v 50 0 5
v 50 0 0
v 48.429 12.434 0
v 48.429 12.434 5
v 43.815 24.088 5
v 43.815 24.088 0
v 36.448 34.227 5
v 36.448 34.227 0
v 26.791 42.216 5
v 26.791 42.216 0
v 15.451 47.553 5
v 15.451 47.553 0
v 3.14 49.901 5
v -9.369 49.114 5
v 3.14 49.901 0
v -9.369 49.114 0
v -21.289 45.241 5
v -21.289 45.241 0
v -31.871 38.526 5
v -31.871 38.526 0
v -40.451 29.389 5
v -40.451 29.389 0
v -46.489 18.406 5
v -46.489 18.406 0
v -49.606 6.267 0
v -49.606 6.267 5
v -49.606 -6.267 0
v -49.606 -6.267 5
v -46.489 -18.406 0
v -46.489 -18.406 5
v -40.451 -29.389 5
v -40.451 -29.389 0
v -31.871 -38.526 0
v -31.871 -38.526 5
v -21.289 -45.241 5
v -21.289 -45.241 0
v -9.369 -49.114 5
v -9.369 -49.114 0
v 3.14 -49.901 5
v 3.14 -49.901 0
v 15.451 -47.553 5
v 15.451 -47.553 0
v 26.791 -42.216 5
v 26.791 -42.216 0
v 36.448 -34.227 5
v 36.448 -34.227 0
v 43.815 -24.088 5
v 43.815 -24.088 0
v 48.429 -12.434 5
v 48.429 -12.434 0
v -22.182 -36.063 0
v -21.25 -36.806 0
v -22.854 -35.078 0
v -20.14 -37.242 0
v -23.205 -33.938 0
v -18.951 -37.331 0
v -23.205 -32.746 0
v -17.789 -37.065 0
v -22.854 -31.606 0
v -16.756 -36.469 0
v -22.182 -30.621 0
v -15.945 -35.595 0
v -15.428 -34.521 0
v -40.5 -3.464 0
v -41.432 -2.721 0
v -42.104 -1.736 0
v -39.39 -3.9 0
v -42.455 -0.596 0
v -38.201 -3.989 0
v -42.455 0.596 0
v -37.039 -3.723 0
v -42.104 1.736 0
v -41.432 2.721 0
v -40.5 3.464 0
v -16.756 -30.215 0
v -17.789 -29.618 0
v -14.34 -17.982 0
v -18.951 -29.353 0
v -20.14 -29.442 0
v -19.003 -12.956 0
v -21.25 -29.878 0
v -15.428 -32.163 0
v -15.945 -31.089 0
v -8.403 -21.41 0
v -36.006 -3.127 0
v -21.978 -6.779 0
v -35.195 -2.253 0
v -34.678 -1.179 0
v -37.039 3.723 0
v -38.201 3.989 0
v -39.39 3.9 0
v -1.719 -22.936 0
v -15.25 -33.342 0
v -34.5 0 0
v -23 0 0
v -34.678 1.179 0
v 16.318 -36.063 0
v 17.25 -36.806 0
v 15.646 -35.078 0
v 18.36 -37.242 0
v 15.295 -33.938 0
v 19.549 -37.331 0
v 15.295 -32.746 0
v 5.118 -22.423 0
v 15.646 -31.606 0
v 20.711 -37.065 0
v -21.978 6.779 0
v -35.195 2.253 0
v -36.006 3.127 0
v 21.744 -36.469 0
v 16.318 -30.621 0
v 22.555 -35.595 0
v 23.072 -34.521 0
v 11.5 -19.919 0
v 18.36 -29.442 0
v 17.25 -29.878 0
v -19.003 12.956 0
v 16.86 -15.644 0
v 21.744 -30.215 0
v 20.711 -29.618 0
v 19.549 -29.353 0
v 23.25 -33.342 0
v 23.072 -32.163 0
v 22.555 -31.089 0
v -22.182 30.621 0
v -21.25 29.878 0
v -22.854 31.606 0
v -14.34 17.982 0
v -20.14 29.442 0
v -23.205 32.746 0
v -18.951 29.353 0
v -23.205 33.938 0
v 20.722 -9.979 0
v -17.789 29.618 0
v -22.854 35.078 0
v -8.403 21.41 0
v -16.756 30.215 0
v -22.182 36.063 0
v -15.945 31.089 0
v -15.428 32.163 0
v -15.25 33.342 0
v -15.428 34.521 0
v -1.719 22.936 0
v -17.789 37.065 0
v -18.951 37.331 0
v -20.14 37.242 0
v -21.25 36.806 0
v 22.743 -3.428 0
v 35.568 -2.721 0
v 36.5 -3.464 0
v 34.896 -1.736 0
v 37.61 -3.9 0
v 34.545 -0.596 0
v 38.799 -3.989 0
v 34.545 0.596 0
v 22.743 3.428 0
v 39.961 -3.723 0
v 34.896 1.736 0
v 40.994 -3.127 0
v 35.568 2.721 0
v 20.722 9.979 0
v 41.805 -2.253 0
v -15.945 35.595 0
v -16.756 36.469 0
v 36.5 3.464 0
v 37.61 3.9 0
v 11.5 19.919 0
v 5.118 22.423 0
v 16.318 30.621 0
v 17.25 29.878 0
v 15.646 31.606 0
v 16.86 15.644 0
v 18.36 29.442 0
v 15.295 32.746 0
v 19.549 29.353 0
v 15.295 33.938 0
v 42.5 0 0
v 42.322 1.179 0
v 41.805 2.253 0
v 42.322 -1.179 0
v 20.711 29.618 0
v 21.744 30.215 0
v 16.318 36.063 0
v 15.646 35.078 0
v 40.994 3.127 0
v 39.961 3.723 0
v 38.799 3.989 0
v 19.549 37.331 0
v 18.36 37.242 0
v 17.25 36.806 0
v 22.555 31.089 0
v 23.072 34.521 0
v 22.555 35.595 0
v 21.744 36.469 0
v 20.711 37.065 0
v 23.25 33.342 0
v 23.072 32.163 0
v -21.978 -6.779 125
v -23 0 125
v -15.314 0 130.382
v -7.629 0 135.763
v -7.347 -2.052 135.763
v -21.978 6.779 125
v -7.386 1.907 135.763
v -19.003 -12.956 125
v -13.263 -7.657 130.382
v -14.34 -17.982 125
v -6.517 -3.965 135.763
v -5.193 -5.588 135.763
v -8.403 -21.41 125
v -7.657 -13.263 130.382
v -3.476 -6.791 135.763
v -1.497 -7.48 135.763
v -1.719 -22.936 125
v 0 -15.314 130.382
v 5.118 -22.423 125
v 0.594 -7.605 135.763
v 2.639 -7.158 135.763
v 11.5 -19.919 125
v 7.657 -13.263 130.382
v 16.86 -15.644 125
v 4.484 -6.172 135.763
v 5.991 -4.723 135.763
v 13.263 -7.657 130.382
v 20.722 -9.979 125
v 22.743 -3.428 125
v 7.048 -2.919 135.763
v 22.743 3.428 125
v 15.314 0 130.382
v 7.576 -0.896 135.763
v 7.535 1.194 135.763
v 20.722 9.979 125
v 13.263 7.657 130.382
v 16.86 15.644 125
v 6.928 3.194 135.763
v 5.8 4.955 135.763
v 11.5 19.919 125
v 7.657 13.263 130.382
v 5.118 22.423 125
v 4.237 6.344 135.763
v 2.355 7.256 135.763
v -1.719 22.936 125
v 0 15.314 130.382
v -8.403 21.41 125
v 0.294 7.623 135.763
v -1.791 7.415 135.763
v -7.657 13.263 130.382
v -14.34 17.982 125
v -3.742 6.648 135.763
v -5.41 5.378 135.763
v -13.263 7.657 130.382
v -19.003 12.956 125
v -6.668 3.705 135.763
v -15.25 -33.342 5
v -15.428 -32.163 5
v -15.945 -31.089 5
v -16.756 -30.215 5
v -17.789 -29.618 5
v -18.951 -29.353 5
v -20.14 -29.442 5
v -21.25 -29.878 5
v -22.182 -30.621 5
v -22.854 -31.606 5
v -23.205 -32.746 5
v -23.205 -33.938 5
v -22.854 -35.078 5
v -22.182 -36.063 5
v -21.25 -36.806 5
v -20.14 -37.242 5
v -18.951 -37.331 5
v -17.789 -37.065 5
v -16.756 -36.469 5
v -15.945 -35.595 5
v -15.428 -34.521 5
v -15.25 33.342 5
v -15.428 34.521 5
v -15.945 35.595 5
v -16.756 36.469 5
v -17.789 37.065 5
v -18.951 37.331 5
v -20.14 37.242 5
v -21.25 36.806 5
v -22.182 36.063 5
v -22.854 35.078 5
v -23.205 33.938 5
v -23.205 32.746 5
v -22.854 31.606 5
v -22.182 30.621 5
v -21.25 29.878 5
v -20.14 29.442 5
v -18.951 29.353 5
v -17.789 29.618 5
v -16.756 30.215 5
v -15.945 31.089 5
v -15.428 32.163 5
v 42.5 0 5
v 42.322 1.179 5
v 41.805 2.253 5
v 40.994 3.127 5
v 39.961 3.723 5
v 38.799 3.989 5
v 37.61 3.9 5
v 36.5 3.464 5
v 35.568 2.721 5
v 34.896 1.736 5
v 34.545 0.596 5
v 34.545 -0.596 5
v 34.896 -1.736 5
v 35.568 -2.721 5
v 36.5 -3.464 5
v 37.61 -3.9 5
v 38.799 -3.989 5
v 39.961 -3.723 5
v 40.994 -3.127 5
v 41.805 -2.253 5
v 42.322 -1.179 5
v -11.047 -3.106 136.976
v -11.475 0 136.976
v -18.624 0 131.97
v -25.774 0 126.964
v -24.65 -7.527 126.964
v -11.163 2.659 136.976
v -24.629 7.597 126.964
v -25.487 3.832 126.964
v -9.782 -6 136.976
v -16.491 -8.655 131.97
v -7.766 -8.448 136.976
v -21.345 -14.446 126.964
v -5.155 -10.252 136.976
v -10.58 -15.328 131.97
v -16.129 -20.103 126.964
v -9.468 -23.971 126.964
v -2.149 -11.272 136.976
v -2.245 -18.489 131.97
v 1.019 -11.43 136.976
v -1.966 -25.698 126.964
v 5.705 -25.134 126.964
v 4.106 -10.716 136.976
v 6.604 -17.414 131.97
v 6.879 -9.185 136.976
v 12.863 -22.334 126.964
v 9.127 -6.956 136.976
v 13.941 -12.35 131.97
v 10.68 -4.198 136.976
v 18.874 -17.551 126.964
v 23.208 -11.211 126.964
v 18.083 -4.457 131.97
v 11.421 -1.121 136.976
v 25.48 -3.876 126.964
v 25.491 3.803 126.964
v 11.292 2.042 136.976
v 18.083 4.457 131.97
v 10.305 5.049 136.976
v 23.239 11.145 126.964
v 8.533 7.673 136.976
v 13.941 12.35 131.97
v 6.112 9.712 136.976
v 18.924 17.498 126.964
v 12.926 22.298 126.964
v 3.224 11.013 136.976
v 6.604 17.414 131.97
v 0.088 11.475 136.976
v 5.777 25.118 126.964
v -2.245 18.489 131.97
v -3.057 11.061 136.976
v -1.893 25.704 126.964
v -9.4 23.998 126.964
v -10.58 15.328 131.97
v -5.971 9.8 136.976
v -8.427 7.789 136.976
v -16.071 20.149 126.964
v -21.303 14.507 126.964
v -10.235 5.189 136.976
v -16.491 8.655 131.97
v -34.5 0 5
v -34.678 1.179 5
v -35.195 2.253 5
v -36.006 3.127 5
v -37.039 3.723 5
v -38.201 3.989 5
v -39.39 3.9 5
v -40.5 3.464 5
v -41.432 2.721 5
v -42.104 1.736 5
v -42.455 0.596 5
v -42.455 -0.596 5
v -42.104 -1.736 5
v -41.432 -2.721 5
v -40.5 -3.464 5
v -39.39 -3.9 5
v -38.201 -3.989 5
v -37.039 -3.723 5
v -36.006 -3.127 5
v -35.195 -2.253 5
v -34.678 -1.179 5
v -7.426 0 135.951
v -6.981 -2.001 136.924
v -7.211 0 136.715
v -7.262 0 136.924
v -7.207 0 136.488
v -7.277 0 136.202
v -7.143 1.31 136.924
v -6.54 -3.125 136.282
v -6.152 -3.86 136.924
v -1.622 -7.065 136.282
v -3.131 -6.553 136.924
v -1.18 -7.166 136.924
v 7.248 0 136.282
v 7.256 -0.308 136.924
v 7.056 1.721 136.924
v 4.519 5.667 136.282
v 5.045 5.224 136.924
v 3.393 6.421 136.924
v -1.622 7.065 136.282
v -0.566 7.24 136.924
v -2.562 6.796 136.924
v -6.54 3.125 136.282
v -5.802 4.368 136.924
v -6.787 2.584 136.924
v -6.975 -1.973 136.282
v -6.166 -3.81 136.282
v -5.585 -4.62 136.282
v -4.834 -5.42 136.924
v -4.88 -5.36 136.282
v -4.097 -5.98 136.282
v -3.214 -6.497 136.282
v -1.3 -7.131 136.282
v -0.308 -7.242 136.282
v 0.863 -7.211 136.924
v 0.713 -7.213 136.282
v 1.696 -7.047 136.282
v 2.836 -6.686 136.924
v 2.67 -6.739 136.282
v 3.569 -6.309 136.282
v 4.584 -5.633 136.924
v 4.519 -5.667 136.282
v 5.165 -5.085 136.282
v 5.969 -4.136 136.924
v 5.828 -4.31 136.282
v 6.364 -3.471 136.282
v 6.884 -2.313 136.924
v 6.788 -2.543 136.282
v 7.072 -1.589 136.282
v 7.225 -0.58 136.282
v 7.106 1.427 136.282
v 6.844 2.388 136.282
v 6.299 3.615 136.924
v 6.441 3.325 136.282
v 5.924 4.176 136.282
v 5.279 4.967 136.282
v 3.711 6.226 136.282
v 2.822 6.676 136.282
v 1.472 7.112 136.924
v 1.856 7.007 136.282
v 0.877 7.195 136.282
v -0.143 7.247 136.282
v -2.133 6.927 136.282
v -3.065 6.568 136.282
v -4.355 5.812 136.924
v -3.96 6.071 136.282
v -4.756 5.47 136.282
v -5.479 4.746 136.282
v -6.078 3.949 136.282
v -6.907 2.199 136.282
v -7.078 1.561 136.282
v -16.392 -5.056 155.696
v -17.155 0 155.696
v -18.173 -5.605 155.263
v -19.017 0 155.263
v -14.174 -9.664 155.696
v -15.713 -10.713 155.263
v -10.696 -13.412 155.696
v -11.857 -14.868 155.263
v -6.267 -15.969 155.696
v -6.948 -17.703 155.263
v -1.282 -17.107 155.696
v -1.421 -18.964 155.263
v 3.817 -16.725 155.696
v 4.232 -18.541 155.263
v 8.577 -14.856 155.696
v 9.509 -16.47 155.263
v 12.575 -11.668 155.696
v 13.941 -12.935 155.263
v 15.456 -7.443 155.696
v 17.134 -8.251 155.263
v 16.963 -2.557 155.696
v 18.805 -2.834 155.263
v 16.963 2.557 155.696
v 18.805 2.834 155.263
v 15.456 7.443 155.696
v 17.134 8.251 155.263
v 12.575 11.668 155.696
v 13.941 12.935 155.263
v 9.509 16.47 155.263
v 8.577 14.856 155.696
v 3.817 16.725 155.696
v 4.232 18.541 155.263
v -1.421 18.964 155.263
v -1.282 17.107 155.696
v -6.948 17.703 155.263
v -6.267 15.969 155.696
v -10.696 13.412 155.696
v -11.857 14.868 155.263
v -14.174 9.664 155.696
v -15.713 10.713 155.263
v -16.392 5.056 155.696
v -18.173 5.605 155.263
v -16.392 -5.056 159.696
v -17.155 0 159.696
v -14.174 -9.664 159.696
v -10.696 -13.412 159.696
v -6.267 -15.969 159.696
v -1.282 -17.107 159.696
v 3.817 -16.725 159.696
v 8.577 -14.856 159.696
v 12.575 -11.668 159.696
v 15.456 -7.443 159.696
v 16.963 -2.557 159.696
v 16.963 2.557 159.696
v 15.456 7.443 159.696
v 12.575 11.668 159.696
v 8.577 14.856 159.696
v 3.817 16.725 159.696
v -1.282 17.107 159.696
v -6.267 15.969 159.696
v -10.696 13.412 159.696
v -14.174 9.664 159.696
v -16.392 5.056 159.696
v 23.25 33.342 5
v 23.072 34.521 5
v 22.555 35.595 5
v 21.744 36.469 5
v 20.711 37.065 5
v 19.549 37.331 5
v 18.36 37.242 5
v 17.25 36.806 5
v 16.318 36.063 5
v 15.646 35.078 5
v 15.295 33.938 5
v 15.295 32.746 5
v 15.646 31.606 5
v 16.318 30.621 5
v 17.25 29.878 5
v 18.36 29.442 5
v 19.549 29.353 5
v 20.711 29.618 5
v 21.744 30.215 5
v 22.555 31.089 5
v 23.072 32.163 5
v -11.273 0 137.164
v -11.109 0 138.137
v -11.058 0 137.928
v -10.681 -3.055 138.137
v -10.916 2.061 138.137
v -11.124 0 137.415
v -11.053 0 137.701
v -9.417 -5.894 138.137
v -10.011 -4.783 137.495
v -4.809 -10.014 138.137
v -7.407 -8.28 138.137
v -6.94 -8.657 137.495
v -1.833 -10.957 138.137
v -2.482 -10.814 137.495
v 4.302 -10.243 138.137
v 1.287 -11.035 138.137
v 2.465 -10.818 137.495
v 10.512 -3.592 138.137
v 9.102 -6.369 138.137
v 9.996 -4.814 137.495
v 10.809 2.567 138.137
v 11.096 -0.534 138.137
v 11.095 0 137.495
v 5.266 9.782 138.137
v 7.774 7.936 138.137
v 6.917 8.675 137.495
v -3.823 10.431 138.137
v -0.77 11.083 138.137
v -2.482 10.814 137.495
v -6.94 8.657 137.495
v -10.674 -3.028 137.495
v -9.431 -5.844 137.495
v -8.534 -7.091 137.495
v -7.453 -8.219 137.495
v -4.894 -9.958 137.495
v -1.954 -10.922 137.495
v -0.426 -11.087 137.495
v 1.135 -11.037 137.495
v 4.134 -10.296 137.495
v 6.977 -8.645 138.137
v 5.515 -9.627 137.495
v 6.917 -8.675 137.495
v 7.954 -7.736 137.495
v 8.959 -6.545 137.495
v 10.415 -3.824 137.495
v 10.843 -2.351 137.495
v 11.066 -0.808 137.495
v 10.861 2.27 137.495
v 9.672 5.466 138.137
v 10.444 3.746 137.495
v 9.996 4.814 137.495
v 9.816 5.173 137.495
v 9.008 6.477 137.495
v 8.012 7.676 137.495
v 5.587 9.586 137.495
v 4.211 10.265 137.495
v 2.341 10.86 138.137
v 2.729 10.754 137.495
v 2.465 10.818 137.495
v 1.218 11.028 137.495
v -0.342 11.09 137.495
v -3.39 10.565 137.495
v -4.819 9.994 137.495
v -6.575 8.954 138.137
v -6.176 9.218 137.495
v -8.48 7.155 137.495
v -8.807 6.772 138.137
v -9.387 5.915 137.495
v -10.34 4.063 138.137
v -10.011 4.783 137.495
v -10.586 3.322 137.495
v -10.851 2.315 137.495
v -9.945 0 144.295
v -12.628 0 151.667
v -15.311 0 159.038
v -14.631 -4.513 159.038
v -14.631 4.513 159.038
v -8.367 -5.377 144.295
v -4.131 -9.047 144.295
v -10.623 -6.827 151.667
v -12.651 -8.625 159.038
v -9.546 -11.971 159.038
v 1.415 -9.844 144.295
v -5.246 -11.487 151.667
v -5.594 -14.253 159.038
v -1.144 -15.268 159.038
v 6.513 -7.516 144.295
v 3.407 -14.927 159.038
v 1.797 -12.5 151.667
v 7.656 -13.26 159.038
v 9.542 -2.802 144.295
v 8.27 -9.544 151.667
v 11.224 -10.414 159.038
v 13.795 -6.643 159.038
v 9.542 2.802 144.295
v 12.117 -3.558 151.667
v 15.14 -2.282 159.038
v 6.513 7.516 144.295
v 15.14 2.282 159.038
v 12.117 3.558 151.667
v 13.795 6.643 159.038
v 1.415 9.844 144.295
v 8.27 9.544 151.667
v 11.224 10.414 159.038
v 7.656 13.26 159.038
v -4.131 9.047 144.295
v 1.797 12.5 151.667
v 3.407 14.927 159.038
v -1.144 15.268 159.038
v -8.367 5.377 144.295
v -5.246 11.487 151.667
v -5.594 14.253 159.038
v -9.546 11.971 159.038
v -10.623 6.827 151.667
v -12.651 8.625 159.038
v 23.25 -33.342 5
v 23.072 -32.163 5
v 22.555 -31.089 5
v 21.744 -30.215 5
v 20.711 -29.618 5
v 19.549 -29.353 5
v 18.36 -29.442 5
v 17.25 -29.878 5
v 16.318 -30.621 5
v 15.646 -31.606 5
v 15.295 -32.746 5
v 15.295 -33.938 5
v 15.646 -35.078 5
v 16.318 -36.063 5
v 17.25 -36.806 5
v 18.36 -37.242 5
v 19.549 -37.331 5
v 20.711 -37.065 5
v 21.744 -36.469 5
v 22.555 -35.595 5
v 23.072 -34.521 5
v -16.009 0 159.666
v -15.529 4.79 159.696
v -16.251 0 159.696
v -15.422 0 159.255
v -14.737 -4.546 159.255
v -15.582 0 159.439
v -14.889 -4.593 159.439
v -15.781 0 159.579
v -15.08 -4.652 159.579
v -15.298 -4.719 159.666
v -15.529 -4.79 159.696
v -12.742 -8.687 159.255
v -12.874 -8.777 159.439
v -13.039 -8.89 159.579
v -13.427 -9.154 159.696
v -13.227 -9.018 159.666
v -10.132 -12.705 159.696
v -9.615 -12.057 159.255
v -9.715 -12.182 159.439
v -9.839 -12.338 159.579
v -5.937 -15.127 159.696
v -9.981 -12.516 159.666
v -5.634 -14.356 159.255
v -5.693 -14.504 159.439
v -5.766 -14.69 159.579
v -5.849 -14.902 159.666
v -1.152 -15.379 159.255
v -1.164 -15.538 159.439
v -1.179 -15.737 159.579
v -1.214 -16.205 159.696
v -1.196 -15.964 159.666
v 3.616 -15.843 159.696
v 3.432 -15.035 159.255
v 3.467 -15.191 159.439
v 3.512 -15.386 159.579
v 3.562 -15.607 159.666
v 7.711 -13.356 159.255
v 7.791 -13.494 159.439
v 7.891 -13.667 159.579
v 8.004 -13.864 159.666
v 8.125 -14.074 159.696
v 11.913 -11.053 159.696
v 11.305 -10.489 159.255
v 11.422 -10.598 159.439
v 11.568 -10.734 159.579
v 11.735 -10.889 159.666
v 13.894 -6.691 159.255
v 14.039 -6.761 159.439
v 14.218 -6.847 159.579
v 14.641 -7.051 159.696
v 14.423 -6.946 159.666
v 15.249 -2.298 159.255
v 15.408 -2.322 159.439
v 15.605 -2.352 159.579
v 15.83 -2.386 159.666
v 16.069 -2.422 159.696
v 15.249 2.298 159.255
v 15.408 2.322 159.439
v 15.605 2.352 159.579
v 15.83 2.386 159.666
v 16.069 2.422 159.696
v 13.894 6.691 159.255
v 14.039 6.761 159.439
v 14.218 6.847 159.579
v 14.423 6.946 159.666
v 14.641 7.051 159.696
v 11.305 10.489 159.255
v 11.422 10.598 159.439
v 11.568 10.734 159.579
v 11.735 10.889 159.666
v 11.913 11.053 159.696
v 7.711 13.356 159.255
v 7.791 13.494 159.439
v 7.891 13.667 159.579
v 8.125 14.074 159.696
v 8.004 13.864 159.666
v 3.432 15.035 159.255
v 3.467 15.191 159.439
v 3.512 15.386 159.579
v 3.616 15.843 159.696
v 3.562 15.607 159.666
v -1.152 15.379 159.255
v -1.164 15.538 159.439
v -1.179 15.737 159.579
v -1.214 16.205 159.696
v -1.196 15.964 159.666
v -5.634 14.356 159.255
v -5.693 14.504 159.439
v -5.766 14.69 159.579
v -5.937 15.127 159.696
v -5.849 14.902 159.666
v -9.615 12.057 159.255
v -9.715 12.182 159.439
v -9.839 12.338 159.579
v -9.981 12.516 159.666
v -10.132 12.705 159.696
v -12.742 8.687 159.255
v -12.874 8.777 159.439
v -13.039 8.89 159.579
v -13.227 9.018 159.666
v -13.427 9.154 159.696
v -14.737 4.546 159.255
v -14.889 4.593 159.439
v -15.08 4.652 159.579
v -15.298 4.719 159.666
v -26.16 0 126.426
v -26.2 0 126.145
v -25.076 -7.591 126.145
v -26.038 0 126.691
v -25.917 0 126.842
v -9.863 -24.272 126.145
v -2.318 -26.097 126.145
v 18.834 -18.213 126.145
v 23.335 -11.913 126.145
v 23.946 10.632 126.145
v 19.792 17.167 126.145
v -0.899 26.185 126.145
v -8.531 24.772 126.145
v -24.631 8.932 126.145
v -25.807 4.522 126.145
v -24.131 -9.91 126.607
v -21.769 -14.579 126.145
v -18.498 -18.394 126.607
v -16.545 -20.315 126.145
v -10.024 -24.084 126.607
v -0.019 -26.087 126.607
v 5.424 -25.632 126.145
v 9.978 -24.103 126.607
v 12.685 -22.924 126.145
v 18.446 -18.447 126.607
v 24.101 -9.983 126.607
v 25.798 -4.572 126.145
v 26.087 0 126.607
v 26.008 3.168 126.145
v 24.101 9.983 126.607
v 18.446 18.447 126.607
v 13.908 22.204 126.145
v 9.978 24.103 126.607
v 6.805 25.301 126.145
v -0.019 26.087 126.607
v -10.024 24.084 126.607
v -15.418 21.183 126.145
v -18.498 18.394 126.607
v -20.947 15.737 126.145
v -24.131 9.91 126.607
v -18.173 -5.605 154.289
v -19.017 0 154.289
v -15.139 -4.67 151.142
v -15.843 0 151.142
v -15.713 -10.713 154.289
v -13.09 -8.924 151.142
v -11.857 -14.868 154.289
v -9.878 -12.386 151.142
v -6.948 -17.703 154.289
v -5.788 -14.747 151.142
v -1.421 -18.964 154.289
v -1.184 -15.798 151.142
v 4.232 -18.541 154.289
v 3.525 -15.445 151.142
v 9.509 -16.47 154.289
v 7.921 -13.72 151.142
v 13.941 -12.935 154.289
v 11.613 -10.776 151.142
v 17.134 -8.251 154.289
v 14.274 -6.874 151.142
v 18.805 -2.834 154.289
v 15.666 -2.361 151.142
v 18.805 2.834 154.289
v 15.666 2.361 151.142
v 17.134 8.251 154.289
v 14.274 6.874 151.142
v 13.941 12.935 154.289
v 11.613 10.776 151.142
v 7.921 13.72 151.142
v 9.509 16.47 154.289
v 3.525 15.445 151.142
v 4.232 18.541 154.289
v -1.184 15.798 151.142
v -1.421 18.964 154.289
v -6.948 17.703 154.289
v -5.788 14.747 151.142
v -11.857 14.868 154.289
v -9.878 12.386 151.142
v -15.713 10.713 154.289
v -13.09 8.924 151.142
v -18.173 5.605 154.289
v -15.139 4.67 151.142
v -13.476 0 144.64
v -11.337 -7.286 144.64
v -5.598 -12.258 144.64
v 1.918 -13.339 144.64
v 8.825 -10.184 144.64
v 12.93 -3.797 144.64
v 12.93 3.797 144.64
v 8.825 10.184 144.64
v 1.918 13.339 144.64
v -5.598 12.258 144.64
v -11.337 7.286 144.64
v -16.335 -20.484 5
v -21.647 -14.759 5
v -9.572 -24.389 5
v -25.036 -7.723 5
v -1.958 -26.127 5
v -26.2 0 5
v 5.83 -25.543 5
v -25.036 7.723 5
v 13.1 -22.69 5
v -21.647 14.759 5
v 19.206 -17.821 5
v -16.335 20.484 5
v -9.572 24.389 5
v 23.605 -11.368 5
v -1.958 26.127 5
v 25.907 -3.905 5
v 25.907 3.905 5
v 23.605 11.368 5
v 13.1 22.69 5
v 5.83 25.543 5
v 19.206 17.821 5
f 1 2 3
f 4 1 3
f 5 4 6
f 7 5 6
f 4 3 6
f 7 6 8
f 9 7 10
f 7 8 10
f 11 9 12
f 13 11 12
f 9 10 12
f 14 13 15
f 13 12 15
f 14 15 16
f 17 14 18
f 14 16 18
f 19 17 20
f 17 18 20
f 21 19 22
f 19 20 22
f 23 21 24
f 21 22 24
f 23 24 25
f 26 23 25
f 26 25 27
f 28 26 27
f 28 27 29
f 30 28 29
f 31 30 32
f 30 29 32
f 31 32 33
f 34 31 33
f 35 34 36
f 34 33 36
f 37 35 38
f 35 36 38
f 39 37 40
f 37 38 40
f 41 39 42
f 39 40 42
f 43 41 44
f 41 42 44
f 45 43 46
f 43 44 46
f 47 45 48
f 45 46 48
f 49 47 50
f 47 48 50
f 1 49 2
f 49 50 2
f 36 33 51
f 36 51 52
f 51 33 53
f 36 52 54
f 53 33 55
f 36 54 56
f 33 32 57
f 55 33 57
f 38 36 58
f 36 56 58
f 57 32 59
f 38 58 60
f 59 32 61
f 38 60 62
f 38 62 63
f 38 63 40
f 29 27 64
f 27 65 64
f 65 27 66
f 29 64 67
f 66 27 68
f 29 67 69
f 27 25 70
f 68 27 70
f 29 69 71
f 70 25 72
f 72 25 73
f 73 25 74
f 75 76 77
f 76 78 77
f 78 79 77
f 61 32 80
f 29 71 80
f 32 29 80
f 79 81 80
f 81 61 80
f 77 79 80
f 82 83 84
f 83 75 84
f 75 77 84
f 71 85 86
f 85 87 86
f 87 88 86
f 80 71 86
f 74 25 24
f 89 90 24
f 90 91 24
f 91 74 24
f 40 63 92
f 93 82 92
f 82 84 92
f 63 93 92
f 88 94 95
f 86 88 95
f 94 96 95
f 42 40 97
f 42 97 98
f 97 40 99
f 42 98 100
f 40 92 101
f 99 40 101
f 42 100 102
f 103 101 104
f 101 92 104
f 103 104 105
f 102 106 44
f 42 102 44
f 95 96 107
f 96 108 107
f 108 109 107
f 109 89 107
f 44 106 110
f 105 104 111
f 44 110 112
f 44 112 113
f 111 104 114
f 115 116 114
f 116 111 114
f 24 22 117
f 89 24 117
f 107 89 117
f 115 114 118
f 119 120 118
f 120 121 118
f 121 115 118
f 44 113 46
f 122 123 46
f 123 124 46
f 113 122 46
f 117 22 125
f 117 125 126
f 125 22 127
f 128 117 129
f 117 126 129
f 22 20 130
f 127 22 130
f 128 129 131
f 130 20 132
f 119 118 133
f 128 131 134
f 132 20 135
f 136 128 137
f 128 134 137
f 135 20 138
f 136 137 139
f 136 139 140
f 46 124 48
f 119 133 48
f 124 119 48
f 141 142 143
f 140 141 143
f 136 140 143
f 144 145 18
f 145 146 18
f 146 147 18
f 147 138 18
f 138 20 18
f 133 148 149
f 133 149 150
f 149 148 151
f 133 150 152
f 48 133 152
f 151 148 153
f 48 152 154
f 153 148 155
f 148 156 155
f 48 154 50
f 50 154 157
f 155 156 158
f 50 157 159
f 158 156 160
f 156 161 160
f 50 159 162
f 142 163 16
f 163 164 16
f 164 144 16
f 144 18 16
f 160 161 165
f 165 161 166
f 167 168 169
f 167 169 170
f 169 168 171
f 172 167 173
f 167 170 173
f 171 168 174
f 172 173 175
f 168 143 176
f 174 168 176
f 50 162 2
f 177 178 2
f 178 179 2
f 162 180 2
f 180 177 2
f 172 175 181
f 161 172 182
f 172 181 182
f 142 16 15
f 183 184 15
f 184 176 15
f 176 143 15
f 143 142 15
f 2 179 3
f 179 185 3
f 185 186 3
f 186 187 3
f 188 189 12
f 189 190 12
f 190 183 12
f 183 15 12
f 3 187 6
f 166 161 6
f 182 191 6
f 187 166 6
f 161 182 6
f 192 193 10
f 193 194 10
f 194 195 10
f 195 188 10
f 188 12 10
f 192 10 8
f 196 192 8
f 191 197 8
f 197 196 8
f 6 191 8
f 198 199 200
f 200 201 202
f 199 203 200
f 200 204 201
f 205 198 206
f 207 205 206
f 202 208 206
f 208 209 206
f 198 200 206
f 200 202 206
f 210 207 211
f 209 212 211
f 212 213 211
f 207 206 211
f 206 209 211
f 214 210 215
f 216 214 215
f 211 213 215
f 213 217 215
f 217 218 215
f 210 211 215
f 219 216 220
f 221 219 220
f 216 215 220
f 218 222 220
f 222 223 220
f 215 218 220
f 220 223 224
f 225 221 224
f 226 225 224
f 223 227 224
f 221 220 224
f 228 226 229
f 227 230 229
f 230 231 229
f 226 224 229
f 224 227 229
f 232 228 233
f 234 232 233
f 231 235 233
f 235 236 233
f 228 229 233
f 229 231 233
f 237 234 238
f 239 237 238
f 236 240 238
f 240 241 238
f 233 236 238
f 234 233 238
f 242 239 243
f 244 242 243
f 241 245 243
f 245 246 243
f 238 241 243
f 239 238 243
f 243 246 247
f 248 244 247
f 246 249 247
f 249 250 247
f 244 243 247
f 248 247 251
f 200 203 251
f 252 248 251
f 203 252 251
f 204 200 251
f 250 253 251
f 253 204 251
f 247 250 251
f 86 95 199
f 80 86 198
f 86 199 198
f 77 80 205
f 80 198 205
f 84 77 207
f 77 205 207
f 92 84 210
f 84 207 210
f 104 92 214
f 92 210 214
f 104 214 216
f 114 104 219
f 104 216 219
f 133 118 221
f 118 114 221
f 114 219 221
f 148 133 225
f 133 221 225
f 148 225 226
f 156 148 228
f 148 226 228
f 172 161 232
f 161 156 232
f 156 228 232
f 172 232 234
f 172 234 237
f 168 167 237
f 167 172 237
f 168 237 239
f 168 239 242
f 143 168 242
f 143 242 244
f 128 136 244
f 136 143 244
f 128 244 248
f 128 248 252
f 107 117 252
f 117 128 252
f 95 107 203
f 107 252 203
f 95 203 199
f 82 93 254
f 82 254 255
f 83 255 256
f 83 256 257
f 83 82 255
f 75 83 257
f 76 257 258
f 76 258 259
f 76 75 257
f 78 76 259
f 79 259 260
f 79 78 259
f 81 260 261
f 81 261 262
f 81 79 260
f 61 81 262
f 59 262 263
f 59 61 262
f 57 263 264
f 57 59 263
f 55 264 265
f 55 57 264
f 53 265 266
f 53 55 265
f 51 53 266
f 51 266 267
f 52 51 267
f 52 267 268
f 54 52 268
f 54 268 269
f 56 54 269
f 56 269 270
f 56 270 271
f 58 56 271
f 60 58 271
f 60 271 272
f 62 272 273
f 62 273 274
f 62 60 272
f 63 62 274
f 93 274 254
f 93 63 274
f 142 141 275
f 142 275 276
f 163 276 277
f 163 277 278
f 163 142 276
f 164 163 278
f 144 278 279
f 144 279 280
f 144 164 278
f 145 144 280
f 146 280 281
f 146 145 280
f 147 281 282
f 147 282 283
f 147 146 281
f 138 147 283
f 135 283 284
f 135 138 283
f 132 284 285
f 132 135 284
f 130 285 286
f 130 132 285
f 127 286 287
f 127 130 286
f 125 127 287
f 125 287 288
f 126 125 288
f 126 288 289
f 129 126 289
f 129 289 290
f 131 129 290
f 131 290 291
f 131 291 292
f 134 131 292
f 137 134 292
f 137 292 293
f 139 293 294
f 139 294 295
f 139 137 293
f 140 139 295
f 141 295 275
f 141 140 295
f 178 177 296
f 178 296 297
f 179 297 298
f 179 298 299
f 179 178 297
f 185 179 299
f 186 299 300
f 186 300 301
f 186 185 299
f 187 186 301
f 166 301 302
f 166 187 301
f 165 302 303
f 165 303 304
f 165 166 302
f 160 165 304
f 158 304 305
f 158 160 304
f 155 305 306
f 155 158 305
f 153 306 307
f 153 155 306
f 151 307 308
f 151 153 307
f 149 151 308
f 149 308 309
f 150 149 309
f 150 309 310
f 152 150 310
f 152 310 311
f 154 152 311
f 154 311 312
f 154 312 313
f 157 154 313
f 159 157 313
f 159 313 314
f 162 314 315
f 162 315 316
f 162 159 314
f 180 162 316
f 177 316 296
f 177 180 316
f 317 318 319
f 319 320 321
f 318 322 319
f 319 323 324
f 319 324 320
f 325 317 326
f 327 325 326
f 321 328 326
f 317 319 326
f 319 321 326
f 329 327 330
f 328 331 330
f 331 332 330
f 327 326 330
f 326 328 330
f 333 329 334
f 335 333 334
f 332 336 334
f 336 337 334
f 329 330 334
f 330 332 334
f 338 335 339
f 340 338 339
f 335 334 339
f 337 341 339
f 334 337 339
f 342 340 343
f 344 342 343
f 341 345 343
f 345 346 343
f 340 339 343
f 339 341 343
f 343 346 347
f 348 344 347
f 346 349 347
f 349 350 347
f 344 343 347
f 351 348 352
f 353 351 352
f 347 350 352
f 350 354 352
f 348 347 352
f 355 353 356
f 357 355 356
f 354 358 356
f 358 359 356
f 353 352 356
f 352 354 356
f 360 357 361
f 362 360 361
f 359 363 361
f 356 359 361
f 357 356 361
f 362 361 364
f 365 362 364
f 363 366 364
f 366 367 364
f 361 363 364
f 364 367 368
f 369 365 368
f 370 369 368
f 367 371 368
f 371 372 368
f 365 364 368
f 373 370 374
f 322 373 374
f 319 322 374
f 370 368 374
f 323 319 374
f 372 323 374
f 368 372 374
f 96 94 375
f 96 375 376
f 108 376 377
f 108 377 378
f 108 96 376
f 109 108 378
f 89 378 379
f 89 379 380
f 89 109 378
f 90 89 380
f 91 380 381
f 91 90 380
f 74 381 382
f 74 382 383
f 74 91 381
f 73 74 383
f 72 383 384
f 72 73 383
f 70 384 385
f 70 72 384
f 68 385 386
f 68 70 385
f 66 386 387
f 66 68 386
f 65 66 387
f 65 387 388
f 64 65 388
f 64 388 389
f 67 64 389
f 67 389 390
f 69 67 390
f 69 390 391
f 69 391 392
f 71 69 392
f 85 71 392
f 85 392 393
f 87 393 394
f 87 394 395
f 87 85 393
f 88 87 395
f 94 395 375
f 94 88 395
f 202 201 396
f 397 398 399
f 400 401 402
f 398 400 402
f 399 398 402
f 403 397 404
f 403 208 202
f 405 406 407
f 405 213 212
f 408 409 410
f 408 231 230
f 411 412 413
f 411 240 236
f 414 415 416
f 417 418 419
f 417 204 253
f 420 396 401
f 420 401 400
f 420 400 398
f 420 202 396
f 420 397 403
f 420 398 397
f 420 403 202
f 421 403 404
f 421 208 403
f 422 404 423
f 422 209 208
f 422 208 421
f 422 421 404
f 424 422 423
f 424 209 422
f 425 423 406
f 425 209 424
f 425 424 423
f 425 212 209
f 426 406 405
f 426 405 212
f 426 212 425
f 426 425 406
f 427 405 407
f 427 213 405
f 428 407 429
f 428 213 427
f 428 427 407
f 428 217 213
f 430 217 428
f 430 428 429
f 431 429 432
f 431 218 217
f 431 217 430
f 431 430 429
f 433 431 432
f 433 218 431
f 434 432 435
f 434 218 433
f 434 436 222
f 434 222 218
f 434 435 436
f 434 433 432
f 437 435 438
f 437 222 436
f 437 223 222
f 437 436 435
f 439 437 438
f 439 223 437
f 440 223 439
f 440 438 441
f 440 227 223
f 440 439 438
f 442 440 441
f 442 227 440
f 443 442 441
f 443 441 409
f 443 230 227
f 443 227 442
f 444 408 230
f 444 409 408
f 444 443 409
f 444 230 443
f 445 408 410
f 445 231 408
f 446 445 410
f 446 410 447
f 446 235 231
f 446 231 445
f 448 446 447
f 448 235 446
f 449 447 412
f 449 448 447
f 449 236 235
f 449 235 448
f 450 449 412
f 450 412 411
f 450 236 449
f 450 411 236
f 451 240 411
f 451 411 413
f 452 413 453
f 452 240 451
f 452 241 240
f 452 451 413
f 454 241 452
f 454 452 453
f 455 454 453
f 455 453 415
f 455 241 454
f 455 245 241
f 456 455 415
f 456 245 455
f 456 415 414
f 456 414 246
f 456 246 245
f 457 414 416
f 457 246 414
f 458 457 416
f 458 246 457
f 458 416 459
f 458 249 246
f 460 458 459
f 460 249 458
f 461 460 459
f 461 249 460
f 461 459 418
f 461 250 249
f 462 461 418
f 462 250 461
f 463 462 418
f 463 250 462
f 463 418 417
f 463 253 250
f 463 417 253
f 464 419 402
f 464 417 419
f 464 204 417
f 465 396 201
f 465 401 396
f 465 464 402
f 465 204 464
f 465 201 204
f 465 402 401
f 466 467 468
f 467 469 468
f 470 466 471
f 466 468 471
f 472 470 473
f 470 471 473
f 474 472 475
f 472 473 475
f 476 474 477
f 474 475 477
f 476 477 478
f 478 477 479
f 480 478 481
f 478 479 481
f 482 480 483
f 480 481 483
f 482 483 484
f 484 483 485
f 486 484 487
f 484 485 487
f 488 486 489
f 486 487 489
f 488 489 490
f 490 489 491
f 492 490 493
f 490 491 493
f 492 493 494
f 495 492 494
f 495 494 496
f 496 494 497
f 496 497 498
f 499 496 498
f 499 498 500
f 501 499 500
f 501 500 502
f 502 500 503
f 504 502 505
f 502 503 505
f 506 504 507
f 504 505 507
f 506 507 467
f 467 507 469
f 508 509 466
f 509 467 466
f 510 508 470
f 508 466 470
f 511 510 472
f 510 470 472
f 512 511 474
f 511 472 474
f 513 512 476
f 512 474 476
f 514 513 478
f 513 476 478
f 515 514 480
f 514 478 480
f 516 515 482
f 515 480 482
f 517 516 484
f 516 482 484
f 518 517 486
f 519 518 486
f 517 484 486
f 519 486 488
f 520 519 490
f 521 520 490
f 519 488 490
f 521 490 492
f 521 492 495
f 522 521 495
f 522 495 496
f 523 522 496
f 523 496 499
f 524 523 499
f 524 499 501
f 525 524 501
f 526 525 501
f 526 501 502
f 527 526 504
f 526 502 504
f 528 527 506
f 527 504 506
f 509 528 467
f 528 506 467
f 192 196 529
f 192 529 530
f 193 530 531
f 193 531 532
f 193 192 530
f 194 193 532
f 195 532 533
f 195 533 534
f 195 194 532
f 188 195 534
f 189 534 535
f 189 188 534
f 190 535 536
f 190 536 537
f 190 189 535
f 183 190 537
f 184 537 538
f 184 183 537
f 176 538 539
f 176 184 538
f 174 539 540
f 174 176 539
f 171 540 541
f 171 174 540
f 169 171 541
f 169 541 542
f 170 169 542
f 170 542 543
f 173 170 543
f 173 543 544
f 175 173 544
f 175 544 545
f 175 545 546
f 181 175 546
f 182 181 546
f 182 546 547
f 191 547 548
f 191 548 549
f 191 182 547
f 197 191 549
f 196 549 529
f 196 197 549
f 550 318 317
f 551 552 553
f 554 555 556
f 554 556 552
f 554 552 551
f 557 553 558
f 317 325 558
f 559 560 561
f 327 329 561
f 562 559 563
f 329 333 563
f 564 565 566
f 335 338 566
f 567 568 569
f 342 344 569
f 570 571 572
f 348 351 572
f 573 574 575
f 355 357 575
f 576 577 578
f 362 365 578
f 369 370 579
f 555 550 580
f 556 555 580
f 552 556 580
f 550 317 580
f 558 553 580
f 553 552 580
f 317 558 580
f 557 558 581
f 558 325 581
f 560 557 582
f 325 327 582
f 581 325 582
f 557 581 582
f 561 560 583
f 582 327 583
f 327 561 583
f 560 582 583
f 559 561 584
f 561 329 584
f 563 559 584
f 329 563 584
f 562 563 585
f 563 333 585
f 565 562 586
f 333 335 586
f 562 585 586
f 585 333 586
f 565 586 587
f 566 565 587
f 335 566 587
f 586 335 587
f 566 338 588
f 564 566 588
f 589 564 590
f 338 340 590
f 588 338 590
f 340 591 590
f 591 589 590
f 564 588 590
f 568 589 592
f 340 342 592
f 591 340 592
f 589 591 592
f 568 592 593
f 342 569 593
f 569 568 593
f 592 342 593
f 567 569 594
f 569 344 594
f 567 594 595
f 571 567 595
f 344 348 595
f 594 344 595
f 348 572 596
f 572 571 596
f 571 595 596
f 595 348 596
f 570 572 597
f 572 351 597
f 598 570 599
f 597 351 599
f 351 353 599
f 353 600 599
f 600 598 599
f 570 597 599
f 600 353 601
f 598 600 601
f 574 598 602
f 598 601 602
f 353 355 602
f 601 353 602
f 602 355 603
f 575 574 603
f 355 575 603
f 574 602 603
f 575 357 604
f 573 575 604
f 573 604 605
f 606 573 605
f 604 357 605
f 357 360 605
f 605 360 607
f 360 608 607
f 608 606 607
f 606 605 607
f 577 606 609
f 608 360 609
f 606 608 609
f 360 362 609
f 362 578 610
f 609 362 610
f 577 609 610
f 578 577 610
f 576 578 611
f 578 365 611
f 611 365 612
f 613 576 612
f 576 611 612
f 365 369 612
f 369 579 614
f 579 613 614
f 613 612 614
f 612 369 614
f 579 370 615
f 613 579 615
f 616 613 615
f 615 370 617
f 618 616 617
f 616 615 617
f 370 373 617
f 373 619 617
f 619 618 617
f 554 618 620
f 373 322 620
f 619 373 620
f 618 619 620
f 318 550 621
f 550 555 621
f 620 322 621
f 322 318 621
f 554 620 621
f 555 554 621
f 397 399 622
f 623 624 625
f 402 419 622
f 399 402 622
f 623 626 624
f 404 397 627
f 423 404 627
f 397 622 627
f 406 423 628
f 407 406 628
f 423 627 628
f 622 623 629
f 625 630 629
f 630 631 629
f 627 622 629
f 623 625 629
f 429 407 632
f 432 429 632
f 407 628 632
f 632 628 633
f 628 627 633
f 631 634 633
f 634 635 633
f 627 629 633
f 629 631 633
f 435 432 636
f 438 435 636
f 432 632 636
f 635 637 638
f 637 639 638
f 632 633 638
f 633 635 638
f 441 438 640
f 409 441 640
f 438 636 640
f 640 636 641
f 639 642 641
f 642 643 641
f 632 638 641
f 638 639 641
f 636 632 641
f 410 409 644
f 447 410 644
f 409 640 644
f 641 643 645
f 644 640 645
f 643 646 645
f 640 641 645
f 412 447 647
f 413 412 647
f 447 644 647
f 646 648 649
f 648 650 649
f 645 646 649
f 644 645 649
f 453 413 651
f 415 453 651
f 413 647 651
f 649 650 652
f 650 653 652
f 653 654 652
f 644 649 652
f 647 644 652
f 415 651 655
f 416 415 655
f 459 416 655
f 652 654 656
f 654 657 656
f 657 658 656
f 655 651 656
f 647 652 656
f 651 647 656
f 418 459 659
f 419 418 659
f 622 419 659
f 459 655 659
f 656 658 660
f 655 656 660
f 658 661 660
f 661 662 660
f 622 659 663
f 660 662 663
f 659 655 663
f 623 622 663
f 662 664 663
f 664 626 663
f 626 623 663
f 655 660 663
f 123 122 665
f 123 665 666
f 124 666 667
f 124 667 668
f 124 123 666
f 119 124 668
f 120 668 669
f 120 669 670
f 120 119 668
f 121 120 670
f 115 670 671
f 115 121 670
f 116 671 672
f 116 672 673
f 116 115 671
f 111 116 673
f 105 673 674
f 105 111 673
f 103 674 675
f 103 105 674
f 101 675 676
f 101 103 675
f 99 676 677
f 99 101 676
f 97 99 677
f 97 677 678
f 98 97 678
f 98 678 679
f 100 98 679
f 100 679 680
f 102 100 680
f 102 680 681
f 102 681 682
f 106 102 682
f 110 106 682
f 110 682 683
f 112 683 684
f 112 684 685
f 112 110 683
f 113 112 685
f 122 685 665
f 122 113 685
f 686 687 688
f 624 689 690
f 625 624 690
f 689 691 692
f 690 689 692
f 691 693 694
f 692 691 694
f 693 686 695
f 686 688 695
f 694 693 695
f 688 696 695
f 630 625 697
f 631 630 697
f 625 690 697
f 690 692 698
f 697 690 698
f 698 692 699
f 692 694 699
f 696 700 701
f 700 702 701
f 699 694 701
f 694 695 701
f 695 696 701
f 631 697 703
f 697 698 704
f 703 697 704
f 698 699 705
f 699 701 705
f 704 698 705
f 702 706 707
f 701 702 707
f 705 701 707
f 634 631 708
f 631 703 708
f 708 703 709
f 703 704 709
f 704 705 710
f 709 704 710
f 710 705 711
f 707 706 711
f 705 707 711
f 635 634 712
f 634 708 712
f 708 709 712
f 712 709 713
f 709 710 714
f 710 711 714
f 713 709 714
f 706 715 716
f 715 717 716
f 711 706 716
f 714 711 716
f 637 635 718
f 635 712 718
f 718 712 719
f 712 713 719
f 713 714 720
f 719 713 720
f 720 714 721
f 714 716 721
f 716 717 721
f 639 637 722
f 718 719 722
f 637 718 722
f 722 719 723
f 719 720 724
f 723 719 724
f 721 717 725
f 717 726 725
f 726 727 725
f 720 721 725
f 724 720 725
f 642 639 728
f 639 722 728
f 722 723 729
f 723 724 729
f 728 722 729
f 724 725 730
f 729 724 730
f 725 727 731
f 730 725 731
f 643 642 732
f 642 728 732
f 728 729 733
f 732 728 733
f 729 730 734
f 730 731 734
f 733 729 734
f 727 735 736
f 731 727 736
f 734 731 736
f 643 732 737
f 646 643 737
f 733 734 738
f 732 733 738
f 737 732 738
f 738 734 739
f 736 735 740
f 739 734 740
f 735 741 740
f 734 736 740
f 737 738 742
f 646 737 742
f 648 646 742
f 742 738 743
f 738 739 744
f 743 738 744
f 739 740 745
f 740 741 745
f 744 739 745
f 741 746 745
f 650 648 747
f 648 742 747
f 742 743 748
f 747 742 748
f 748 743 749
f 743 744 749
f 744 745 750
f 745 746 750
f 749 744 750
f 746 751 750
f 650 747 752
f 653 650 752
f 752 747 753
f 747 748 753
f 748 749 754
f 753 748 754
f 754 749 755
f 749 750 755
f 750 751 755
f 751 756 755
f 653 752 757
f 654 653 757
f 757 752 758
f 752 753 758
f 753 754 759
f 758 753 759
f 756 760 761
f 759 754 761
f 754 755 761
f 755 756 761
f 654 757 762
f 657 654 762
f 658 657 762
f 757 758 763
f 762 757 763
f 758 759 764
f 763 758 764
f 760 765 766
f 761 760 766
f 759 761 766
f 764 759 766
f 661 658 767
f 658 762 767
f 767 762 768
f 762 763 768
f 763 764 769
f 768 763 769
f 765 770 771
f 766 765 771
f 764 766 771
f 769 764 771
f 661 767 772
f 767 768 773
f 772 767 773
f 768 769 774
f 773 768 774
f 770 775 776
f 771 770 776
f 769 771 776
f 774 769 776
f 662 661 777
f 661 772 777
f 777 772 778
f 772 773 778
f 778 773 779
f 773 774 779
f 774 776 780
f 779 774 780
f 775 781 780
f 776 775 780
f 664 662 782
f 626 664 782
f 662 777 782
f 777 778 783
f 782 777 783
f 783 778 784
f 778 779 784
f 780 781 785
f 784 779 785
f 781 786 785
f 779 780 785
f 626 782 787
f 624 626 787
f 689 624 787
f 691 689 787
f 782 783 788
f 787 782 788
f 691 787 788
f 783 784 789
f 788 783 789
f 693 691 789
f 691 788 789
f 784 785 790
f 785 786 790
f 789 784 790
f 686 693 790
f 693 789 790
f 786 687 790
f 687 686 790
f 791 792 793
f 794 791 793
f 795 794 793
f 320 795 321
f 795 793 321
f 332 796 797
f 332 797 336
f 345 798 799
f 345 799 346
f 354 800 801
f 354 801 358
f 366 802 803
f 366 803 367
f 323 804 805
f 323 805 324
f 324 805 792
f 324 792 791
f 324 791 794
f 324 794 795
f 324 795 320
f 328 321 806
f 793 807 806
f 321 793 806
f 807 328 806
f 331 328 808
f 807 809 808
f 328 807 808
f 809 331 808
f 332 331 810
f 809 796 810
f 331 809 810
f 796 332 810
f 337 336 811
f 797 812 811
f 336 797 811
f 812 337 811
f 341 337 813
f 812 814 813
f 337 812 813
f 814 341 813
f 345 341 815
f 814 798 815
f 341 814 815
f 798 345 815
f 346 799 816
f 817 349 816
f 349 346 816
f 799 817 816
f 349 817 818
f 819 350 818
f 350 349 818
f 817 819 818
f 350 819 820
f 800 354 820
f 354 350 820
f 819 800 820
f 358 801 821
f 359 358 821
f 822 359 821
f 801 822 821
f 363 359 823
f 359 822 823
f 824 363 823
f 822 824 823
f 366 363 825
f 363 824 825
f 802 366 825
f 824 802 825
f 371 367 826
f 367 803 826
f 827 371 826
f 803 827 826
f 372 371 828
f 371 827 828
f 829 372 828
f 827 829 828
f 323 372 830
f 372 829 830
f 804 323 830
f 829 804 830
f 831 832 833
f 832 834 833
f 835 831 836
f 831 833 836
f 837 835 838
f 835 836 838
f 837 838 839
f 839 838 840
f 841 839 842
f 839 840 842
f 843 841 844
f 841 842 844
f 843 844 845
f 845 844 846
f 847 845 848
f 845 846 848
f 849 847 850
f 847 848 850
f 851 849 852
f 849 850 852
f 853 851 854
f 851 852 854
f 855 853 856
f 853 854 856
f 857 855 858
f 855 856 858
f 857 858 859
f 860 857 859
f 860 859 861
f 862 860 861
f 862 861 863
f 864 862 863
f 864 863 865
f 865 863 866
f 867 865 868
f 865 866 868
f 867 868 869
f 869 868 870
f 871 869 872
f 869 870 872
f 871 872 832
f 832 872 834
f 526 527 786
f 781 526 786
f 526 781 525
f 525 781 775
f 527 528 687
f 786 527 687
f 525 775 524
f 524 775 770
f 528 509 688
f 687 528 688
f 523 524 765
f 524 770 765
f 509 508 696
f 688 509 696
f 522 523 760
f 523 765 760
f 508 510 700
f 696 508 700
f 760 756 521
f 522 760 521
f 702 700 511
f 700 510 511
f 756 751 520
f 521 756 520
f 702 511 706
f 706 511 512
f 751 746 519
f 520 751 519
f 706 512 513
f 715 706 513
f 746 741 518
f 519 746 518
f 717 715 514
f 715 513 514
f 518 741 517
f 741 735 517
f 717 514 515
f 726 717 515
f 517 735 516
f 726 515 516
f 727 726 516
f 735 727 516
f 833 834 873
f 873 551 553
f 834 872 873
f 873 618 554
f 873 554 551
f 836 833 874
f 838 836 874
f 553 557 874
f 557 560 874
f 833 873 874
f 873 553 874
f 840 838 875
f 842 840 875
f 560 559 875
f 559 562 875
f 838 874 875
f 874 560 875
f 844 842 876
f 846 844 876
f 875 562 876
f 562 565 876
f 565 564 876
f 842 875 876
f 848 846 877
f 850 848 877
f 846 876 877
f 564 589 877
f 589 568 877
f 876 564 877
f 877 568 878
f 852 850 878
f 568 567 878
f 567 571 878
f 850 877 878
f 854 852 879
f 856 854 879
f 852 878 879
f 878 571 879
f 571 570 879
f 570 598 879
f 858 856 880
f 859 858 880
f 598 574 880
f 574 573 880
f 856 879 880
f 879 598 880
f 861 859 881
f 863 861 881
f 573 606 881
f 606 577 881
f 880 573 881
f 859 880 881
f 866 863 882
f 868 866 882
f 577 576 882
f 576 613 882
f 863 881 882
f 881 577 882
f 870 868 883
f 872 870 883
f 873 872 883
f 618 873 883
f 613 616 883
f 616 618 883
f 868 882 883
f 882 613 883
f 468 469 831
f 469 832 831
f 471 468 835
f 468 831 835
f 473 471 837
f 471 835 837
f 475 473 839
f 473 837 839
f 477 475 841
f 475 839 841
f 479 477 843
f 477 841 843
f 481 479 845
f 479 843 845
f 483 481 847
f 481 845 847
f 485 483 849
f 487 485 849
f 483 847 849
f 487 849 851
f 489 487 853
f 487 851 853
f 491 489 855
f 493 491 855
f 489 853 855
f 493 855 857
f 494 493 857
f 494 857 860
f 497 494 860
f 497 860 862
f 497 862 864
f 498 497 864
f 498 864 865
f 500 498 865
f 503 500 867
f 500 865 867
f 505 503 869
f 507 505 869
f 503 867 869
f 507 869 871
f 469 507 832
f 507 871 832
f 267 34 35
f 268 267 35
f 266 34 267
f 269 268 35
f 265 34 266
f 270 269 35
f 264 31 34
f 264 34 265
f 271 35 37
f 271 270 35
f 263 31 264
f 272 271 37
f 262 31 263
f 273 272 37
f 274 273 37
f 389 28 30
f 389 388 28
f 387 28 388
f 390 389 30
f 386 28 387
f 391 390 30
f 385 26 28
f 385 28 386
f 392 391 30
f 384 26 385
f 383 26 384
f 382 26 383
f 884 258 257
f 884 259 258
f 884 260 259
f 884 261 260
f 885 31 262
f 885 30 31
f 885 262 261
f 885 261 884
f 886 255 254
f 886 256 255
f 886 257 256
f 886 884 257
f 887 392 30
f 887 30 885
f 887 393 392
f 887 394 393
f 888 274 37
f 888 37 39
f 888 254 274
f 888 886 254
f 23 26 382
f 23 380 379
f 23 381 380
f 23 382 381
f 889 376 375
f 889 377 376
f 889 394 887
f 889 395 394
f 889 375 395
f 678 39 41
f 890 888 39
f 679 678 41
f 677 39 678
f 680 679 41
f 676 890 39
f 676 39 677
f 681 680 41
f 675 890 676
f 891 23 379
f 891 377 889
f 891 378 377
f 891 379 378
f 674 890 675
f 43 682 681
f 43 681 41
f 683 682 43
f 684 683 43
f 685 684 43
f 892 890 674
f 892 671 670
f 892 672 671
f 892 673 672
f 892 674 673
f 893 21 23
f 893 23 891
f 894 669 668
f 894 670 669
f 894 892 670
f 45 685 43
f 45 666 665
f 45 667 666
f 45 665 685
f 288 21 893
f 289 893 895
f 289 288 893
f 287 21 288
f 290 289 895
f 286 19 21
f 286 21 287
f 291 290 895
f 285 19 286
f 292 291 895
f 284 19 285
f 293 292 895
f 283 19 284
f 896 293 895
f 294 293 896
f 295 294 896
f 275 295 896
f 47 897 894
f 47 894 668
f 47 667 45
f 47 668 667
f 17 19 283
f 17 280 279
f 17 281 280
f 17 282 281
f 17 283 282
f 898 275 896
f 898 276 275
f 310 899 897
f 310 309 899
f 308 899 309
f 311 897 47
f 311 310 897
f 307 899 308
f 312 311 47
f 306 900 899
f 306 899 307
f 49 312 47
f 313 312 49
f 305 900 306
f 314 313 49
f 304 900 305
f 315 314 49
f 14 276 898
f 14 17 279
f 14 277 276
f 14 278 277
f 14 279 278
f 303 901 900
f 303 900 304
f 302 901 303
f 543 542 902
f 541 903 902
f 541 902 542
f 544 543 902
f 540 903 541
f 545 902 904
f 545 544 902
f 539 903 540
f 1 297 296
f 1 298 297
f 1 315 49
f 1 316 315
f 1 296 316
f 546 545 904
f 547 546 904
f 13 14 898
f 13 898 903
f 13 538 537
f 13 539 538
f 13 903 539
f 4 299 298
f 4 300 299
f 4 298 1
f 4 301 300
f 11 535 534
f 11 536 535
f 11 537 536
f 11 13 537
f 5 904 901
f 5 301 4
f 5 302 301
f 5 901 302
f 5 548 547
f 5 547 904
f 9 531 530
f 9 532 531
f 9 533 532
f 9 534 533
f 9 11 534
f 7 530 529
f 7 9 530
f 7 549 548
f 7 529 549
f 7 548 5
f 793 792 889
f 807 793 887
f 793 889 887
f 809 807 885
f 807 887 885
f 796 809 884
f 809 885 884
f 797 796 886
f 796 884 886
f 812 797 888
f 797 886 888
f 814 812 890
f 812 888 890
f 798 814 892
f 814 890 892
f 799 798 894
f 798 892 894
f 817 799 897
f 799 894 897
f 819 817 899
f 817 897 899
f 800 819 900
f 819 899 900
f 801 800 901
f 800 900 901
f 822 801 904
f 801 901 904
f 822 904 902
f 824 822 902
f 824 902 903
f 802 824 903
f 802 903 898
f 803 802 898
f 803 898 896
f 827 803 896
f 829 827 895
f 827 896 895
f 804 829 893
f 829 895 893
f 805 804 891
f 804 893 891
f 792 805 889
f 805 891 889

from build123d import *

# Parameters (mm, degrees)
F0_R     = 50
F0_R_2   = 4
F0_R_3   = 23
F2_DEPTH = 5
F4_R     = 1
F5_R     = 1


with BuildPart() as f2:
    # F0 (on Top) → F2 (new body)
    with BuildSketch(Plane.XY):
        Circle(F0_R)
        with Locations((-19.25, -33.341978)):
            Circle(F0_R_2, mode=Mode.SUBTRACT)
        with Locations((19.25, -33.341978)):
            Circle(F0_R_2, mode=Mode.SUBTRACT)
        with Locations((-38.5, 0)):
            Circle(F0_R_2, mode=Mode.SUBTRACT)
        with Locations((-19.25, 33.341978)):
            Circle(F0_R_2, mode=Mode.SUBTRACT)
        Circle(F0_R_3, mode=Mode.SUBTRACT)
        with Locations((38.5, 0)):
            Circle(F0_R_2, mode=Mode.SUBTRACT)
        with Locations((19.25, 33.341978)):
            Circle(F0_R_2, mode=Mode.SUBTRACT)
    extrude(amount=F2_DEPTH)

    # F1 (on Front) → F3 (revolve)
    with BuildSketch(Plane.XZ):
        Polygon((-26.2, 0), (-23, 0), (-23, 125), (-7, 136.203321), (-15.550504, 159.695636), (-17.154602, 159.695636), (-17.154602, 155.695636), (-19.017419, 155.263182), (-19.017419, 154.289458), (-15.842509, 151.14174), (-10.846829, 137.416221), (-26.2, 126.665815), align=None)
    revolve(axis=Axis((0, 0, 80), (0, 0, 1)))

    # F4
    f4_edges = [f2.edges().sort_by_distance(p)[0] for p in [
        (7, 0, 136.203321),
        (26.2, 0, 126.665815),
        (15.550504, 0, 159.695636),
    ]]
    fillet(f4_edges, radius=F4_R)

    # F5
    f5_edges = [f2.edges().sort_by_distance(p)[0] for p in [
        (10.846829, 0, 137.416221),
    ]]
    fillet(f5_edges, radius=F5_R)


solid = f2.part
